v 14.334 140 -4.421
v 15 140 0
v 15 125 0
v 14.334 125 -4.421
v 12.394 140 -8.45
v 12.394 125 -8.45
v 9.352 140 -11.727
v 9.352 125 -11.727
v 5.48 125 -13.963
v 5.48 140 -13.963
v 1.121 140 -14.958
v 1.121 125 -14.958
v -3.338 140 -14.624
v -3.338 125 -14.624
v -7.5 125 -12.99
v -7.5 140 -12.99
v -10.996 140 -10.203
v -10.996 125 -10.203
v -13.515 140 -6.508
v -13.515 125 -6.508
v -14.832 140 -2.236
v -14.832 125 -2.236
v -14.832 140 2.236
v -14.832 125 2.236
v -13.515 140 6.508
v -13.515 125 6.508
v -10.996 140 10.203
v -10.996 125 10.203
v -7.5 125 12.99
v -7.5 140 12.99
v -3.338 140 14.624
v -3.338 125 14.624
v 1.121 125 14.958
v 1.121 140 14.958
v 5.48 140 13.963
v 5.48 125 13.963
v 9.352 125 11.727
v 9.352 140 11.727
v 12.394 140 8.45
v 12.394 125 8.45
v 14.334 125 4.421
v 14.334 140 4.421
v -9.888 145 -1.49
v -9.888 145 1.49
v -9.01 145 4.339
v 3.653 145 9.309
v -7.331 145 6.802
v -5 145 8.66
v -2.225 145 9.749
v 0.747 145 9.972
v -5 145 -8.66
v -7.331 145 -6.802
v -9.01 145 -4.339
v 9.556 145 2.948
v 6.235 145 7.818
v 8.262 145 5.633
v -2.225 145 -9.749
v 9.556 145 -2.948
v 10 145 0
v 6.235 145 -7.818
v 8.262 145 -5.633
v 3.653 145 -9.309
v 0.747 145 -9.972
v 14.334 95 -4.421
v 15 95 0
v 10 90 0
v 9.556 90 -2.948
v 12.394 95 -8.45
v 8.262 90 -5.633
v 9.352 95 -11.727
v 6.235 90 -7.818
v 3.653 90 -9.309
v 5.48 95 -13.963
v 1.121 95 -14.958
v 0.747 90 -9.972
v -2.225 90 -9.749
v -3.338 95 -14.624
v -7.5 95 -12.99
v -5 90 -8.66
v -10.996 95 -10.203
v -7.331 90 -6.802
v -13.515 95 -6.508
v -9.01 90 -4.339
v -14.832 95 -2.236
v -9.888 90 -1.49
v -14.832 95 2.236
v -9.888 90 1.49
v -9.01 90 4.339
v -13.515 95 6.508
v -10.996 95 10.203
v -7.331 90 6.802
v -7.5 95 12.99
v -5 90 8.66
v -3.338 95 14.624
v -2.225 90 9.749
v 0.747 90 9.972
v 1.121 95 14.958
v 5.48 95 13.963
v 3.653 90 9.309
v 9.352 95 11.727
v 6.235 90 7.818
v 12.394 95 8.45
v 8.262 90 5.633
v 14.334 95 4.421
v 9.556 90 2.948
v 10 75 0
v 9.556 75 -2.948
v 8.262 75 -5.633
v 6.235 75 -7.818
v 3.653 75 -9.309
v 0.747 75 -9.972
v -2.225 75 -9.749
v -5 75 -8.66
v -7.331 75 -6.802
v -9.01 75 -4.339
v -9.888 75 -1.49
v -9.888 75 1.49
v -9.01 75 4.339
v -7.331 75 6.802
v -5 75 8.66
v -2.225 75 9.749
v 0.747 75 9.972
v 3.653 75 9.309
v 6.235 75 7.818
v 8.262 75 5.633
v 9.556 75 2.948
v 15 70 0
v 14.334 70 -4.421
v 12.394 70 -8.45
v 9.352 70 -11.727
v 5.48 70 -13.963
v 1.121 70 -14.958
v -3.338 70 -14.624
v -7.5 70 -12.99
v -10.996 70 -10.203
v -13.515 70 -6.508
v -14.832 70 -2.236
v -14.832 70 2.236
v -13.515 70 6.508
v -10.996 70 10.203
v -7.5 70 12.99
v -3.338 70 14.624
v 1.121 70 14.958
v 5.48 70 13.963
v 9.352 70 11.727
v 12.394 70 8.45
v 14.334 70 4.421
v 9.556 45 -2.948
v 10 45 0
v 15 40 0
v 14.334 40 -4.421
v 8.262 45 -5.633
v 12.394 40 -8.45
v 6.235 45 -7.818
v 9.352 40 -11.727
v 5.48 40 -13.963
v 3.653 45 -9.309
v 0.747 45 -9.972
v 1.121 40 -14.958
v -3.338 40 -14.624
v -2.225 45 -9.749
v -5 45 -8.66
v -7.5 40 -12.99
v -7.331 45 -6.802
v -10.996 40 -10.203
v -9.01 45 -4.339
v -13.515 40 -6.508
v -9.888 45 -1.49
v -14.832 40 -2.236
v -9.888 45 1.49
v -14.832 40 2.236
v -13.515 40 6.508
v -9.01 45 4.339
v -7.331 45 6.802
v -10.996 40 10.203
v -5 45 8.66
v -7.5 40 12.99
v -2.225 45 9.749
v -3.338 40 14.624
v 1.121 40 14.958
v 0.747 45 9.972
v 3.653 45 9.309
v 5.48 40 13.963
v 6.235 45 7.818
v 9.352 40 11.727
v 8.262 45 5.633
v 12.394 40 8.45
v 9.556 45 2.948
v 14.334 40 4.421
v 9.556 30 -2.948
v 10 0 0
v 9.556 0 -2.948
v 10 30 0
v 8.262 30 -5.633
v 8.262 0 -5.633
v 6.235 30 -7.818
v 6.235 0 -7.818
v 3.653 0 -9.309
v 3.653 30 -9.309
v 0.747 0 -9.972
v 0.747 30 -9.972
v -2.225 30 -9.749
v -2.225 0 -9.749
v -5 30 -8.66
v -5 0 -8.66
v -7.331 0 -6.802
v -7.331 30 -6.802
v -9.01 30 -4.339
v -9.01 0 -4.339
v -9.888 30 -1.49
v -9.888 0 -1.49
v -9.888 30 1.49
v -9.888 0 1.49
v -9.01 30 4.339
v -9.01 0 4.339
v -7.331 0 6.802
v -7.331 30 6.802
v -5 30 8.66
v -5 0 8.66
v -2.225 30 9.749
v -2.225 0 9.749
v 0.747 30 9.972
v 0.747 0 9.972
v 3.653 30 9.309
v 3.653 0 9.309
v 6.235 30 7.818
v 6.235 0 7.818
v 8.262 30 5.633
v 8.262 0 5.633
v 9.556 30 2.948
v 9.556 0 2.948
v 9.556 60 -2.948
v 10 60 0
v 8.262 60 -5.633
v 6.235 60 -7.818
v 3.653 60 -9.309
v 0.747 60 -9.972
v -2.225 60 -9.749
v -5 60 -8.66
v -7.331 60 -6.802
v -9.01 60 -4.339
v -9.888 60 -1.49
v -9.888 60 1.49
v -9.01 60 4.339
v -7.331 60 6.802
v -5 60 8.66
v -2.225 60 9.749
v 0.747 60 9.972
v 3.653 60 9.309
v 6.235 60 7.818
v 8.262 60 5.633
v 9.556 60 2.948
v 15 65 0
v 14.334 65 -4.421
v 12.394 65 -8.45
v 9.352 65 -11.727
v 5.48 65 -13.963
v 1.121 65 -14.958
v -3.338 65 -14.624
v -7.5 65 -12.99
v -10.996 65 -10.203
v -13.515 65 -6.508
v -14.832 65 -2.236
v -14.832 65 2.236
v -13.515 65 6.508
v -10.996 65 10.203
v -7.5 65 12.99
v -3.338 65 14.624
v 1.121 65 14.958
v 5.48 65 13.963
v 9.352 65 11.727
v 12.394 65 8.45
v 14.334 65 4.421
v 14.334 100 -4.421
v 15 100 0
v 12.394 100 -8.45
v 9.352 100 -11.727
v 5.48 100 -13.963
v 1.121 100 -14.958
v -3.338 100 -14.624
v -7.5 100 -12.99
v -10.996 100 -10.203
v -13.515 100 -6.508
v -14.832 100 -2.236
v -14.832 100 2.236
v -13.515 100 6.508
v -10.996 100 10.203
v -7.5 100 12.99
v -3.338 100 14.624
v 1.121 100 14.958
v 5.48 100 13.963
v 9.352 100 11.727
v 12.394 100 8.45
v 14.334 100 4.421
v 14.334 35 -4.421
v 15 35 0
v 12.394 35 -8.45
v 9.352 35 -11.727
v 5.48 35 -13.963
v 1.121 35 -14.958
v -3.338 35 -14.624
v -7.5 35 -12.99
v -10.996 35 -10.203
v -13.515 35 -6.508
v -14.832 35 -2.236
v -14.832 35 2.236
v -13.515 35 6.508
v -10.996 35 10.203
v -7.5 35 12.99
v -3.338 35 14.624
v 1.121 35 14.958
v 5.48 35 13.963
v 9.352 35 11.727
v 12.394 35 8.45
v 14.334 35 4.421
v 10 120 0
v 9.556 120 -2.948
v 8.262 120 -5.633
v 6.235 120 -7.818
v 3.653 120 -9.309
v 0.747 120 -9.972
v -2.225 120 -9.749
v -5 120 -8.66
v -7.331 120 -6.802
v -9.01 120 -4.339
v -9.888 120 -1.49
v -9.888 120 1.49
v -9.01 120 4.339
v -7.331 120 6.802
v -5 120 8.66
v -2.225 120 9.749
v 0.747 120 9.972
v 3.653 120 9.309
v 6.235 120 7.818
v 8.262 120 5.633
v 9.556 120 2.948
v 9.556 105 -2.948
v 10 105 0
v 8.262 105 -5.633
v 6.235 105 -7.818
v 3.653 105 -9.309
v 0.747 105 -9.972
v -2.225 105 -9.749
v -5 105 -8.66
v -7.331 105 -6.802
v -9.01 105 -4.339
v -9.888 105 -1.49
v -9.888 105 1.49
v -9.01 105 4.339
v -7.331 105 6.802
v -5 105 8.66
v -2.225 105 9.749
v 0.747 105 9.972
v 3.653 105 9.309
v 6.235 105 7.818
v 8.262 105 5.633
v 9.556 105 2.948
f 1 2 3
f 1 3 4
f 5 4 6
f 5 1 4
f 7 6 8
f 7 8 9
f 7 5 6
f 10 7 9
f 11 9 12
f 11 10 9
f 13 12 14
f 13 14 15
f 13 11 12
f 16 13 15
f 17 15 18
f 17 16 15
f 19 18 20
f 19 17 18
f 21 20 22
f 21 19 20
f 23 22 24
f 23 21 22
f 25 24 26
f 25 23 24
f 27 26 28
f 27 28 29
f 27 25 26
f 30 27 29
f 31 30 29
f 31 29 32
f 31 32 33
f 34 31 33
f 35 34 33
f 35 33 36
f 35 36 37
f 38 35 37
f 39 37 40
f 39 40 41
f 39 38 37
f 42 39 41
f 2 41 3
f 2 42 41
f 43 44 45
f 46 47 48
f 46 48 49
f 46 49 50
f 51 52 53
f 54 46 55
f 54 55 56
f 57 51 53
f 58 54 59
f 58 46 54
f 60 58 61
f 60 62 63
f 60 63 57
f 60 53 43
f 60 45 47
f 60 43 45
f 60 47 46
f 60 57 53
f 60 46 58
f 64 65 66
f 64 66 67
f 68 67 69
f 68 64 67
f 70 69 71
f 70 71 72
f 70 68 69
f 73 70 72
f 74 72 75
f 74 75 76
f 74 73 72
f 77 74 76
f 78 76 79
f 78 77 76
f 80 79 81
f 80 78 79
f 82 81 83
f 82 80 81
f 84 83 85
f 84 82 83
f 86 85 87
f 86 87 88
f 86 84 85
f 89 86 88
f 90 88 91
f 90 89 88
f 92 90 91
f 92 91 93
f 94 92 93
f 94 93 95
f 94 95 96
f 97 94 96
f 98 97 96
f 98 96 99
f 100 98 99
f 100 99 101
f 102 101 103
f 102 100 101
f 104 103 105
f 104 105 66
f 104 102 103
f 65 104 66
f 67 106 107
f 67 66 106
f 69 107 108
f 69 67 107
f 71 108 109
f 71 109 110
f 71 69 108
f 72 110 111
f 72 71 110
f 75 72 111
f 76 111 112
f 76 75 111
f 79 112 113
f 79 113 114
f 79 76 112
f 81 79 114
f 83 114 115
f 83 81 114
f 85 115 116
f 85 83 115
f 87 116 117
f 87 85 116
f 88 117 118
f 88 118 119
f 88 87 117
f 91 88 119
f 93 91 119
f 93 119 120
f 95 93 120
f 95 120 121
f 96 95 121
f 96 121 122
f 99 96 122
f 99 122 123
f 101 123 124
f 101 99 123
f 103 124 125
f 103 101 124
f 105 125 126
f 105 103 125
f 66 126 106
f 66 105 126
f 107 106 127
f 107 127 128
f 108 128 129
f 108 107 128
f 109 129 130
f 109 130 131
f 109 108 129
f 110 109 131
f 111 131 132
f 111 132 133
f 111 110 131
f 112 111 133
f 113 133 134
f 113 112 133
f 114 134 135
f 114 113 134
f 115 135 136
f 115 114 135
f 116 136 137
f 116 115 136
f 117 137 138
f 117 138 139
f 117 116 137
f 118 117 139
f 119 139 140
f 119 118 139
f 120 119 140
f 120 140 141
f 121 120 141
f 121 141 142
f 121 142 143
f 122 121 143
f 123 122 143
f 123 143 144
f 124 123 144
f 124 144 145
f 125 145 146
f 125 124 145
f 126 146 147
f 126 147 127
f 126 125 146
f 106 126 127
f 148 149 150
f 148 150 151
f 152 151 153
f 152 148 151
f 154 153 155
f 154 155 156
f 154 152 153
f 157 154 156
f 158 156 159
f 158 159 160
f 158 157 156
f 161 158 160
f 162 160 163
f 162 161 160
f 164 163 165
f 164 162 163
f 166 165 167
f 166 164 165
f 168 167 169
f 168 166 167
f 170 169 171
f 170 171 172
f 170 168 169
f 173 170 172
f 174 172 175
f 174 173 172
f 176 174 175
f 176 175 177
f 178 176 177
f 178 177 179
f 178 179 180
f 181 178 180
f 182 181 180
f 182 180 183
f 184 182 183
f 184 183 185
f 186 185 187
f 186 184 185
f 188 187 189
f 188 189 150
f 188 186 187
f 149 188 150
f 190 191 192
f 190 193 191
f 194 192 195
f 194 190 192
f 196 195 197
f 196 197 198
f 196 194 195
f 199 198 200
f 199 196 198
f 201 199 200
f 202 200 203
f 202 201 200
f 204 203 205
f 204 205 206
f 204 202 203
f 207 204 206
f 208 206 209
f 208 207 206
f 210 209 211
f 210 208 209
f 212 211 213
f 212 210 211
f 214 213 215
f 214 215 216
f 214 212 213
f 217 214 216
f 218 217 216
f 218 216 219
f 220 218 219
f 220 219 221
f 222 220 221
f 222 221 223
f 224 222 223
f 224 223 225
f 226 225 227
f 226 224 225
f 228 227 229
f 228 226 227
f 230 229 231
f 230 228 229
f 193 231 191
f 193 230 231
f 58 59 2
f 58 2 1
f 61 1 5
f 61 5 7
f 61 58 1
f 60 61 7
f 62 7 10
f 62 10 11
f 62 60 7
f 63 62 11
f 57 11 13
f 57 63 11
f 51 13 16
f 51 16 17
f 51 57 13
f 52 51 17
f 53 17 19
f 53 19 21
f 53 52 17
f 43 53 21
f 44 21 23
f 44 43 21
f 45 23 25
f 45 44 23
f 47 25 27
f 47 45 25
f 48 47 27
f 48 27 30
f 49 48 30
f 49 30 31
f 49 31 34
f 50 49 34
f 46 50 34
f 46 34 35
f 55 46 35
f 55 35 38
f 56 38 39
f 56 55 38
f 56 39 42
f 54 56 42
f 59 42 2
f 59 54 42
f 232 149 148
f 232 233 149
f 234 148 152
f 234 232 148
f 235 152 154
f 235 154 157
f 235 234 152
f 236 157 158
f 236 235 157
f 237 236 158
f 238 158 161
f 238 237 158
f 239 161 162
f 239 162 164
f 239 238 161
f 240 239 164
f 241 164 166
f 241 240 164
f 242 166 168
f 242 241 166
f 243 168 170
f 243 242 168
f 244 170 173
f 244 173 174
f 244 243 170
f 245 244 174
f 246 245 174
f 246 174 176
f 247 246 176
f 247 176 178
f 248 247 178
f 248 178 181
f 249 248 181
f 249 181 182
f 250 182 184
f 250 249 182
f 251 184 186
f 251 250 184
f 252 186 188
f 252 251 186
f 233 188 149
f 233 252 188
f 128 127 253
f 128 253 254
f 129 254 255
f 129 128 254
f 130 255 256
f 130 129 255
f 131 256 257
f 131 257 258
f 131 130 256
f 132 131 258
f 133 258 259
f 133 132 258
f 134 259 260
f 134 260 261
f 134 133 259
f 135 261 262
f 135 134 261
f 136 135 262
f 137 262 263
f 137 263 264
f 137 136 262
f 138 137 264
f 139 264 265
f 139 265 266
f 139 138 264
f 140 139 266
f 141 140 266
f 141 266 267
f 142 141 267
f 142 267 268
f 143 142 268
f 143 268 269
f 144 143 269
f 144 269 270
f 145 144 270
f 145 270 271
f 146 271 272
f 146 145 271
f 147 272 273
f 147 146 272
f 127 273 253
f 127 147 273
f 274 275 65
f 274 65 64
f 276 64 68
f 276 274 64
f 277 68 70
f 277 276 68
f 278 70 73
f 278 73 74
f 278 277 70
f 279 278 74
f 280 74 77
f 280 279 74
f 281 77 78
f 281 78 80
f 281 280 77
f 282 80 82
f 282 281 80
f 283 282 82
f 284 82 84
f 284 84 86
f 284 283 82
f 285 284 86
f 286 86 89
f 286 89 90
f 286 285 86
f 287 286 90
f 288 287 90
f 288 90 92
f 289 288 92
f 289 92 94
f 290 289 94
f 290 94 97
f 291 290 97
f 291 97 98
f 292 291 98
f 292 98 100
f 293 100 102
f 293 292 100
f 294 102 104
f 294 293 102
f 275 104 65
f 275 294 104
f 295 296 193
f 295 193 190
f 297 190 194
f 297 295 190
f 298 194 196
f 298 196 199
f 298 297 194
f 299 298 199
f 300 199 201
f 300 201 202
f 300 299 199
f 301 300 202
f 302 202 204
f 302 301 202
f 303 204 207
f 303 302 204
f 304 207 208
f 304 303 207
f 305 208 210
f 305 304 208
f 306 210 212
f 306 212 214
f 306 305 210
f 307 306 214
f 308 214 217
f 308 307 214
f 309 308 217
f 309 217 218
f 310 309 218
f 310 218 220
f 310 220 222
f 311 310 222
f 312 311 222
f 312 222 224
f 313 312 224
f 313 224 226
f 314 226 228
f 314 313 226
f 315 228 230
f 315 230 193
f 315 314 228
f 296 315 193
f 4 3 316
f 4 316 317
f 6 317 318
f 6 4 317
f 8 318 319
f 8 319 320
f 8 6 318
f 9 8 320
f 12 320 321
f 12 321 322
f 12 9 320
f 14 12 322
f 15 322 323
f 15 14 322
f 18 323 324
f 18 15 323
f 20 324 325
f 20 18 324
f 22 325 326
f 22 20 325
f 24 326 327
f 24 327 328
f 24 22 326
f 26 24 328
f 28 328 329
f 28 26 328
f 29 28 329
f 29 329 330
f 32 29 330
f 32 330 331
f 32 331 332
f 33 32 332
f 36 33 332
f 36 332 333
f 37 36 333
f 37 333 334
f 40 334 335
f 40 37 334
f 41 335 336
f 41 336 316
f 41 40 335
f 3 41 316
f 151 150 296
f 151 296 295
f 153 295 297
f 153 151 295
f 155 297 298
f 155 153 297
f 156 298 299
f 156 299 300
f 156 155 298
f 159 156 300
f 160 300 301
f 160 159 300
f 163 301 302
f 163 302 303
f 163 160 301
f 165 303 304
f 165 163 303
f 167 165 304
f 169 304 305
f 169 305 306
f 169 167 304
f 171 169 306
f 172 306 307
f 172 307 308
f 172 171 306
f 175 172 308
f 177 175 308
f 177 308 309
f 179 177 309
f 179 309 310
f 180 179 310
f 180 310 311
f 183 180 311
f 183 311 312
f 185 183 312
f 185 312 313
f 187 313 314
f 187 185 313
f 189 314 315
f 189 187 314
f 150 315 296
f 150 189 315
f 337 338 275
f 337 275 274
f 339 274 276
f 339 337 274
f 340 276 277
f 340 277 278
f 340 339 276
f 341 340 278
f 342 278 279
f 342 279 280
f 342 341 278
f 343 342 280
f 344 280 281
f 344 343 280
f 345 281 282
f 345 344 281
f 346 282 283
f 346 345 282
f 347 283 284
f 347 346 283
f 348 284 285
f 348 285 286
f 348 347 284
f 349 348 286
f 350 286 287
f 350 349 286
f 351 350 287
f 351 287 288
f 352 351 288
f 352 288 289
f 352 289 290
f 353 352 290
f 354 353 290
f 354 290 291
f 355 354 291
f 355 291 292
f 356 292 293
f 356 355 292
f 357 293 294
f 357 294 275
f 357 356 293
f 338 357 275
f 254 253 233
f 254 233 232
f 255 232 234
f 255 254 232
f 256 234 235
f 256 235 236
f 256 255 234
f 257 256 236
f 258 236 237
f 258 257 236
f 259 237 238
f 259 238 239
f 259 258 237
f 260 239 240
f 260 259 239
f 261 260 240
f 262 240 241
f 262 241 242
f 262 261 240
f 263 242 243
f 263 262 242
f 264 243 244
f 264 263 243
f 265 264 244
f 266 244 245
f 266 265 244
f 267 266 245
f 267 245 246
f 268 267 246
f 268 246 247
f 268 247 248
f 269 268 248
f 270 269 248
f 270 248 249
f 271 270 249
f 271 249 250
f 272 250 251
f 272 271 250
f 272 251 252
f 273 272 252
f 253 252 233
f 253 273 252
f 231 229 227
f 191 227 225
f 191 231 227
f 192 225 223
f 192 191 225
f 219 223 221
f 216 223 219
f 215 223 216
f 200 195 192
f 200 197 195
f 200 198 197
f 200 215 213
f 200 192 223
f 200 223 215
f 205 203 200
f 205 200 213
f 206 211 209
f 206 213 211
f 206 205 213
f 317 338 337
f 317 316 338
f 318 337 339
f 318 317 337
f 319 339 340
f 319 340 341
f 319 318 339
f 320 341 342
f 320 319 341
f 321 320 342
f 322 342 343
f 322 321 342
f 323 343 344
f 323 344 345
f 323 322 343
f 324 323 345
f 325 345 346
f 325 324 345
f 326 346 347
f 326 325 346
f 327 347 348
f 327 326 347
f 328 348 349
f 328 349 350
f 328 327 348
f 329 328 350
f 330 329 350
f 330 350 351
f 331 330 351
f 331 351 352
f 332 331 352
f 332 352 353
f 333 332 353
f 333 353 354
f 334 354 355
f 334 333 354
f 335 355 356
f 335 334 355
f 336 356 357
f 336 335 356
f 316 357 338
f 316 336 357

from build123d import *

# Parameters (mm, degrees)
F2_SIZE = 4.99999


# Not quite as in the source:
# - a fillet or chamfer is up to 0.001 mm smaller than in the source, because OpenCascade refuses the exact size
# - a feature names something its author has since deleted; it is built from what else it names


with BuildPart() as f1:
    # F0 (on Top) → F1 (revolve)
    with BuildSketch(Plane.XY):
        Polygon((0, 145), (0, 0), (10, 0), (10, 30), (15, 30), (15, 45), (10, 45), (10, 60), (15, 60), (15, 75), (10, 75), (10, 90), (15, 90), (15, 105), (10, 105), (10, 120), (15, 120), (15, 145), align=None)
    revolve(axis=Axis((0, 72.5, 0), (0, 1, 0)))

    # F2 (size 5 in the source; OpenCascade refuses exactly that, so slightly less here)
    f2_edges = [f1.edges().sort_by_distance(p)[0] for p in [
        (-15, 105, 0),
        (-15, 90, 0),
        (-15, 75, 0),
        (-15, 60, 0),
        (-15, 45, 0),
        (-15, 30, 0),
        (-15, 120, 0),
        (-15, 145, 0),
    ]]
    chamfer(f2_edges, length=F2_SIZE)


solid = f1.part
